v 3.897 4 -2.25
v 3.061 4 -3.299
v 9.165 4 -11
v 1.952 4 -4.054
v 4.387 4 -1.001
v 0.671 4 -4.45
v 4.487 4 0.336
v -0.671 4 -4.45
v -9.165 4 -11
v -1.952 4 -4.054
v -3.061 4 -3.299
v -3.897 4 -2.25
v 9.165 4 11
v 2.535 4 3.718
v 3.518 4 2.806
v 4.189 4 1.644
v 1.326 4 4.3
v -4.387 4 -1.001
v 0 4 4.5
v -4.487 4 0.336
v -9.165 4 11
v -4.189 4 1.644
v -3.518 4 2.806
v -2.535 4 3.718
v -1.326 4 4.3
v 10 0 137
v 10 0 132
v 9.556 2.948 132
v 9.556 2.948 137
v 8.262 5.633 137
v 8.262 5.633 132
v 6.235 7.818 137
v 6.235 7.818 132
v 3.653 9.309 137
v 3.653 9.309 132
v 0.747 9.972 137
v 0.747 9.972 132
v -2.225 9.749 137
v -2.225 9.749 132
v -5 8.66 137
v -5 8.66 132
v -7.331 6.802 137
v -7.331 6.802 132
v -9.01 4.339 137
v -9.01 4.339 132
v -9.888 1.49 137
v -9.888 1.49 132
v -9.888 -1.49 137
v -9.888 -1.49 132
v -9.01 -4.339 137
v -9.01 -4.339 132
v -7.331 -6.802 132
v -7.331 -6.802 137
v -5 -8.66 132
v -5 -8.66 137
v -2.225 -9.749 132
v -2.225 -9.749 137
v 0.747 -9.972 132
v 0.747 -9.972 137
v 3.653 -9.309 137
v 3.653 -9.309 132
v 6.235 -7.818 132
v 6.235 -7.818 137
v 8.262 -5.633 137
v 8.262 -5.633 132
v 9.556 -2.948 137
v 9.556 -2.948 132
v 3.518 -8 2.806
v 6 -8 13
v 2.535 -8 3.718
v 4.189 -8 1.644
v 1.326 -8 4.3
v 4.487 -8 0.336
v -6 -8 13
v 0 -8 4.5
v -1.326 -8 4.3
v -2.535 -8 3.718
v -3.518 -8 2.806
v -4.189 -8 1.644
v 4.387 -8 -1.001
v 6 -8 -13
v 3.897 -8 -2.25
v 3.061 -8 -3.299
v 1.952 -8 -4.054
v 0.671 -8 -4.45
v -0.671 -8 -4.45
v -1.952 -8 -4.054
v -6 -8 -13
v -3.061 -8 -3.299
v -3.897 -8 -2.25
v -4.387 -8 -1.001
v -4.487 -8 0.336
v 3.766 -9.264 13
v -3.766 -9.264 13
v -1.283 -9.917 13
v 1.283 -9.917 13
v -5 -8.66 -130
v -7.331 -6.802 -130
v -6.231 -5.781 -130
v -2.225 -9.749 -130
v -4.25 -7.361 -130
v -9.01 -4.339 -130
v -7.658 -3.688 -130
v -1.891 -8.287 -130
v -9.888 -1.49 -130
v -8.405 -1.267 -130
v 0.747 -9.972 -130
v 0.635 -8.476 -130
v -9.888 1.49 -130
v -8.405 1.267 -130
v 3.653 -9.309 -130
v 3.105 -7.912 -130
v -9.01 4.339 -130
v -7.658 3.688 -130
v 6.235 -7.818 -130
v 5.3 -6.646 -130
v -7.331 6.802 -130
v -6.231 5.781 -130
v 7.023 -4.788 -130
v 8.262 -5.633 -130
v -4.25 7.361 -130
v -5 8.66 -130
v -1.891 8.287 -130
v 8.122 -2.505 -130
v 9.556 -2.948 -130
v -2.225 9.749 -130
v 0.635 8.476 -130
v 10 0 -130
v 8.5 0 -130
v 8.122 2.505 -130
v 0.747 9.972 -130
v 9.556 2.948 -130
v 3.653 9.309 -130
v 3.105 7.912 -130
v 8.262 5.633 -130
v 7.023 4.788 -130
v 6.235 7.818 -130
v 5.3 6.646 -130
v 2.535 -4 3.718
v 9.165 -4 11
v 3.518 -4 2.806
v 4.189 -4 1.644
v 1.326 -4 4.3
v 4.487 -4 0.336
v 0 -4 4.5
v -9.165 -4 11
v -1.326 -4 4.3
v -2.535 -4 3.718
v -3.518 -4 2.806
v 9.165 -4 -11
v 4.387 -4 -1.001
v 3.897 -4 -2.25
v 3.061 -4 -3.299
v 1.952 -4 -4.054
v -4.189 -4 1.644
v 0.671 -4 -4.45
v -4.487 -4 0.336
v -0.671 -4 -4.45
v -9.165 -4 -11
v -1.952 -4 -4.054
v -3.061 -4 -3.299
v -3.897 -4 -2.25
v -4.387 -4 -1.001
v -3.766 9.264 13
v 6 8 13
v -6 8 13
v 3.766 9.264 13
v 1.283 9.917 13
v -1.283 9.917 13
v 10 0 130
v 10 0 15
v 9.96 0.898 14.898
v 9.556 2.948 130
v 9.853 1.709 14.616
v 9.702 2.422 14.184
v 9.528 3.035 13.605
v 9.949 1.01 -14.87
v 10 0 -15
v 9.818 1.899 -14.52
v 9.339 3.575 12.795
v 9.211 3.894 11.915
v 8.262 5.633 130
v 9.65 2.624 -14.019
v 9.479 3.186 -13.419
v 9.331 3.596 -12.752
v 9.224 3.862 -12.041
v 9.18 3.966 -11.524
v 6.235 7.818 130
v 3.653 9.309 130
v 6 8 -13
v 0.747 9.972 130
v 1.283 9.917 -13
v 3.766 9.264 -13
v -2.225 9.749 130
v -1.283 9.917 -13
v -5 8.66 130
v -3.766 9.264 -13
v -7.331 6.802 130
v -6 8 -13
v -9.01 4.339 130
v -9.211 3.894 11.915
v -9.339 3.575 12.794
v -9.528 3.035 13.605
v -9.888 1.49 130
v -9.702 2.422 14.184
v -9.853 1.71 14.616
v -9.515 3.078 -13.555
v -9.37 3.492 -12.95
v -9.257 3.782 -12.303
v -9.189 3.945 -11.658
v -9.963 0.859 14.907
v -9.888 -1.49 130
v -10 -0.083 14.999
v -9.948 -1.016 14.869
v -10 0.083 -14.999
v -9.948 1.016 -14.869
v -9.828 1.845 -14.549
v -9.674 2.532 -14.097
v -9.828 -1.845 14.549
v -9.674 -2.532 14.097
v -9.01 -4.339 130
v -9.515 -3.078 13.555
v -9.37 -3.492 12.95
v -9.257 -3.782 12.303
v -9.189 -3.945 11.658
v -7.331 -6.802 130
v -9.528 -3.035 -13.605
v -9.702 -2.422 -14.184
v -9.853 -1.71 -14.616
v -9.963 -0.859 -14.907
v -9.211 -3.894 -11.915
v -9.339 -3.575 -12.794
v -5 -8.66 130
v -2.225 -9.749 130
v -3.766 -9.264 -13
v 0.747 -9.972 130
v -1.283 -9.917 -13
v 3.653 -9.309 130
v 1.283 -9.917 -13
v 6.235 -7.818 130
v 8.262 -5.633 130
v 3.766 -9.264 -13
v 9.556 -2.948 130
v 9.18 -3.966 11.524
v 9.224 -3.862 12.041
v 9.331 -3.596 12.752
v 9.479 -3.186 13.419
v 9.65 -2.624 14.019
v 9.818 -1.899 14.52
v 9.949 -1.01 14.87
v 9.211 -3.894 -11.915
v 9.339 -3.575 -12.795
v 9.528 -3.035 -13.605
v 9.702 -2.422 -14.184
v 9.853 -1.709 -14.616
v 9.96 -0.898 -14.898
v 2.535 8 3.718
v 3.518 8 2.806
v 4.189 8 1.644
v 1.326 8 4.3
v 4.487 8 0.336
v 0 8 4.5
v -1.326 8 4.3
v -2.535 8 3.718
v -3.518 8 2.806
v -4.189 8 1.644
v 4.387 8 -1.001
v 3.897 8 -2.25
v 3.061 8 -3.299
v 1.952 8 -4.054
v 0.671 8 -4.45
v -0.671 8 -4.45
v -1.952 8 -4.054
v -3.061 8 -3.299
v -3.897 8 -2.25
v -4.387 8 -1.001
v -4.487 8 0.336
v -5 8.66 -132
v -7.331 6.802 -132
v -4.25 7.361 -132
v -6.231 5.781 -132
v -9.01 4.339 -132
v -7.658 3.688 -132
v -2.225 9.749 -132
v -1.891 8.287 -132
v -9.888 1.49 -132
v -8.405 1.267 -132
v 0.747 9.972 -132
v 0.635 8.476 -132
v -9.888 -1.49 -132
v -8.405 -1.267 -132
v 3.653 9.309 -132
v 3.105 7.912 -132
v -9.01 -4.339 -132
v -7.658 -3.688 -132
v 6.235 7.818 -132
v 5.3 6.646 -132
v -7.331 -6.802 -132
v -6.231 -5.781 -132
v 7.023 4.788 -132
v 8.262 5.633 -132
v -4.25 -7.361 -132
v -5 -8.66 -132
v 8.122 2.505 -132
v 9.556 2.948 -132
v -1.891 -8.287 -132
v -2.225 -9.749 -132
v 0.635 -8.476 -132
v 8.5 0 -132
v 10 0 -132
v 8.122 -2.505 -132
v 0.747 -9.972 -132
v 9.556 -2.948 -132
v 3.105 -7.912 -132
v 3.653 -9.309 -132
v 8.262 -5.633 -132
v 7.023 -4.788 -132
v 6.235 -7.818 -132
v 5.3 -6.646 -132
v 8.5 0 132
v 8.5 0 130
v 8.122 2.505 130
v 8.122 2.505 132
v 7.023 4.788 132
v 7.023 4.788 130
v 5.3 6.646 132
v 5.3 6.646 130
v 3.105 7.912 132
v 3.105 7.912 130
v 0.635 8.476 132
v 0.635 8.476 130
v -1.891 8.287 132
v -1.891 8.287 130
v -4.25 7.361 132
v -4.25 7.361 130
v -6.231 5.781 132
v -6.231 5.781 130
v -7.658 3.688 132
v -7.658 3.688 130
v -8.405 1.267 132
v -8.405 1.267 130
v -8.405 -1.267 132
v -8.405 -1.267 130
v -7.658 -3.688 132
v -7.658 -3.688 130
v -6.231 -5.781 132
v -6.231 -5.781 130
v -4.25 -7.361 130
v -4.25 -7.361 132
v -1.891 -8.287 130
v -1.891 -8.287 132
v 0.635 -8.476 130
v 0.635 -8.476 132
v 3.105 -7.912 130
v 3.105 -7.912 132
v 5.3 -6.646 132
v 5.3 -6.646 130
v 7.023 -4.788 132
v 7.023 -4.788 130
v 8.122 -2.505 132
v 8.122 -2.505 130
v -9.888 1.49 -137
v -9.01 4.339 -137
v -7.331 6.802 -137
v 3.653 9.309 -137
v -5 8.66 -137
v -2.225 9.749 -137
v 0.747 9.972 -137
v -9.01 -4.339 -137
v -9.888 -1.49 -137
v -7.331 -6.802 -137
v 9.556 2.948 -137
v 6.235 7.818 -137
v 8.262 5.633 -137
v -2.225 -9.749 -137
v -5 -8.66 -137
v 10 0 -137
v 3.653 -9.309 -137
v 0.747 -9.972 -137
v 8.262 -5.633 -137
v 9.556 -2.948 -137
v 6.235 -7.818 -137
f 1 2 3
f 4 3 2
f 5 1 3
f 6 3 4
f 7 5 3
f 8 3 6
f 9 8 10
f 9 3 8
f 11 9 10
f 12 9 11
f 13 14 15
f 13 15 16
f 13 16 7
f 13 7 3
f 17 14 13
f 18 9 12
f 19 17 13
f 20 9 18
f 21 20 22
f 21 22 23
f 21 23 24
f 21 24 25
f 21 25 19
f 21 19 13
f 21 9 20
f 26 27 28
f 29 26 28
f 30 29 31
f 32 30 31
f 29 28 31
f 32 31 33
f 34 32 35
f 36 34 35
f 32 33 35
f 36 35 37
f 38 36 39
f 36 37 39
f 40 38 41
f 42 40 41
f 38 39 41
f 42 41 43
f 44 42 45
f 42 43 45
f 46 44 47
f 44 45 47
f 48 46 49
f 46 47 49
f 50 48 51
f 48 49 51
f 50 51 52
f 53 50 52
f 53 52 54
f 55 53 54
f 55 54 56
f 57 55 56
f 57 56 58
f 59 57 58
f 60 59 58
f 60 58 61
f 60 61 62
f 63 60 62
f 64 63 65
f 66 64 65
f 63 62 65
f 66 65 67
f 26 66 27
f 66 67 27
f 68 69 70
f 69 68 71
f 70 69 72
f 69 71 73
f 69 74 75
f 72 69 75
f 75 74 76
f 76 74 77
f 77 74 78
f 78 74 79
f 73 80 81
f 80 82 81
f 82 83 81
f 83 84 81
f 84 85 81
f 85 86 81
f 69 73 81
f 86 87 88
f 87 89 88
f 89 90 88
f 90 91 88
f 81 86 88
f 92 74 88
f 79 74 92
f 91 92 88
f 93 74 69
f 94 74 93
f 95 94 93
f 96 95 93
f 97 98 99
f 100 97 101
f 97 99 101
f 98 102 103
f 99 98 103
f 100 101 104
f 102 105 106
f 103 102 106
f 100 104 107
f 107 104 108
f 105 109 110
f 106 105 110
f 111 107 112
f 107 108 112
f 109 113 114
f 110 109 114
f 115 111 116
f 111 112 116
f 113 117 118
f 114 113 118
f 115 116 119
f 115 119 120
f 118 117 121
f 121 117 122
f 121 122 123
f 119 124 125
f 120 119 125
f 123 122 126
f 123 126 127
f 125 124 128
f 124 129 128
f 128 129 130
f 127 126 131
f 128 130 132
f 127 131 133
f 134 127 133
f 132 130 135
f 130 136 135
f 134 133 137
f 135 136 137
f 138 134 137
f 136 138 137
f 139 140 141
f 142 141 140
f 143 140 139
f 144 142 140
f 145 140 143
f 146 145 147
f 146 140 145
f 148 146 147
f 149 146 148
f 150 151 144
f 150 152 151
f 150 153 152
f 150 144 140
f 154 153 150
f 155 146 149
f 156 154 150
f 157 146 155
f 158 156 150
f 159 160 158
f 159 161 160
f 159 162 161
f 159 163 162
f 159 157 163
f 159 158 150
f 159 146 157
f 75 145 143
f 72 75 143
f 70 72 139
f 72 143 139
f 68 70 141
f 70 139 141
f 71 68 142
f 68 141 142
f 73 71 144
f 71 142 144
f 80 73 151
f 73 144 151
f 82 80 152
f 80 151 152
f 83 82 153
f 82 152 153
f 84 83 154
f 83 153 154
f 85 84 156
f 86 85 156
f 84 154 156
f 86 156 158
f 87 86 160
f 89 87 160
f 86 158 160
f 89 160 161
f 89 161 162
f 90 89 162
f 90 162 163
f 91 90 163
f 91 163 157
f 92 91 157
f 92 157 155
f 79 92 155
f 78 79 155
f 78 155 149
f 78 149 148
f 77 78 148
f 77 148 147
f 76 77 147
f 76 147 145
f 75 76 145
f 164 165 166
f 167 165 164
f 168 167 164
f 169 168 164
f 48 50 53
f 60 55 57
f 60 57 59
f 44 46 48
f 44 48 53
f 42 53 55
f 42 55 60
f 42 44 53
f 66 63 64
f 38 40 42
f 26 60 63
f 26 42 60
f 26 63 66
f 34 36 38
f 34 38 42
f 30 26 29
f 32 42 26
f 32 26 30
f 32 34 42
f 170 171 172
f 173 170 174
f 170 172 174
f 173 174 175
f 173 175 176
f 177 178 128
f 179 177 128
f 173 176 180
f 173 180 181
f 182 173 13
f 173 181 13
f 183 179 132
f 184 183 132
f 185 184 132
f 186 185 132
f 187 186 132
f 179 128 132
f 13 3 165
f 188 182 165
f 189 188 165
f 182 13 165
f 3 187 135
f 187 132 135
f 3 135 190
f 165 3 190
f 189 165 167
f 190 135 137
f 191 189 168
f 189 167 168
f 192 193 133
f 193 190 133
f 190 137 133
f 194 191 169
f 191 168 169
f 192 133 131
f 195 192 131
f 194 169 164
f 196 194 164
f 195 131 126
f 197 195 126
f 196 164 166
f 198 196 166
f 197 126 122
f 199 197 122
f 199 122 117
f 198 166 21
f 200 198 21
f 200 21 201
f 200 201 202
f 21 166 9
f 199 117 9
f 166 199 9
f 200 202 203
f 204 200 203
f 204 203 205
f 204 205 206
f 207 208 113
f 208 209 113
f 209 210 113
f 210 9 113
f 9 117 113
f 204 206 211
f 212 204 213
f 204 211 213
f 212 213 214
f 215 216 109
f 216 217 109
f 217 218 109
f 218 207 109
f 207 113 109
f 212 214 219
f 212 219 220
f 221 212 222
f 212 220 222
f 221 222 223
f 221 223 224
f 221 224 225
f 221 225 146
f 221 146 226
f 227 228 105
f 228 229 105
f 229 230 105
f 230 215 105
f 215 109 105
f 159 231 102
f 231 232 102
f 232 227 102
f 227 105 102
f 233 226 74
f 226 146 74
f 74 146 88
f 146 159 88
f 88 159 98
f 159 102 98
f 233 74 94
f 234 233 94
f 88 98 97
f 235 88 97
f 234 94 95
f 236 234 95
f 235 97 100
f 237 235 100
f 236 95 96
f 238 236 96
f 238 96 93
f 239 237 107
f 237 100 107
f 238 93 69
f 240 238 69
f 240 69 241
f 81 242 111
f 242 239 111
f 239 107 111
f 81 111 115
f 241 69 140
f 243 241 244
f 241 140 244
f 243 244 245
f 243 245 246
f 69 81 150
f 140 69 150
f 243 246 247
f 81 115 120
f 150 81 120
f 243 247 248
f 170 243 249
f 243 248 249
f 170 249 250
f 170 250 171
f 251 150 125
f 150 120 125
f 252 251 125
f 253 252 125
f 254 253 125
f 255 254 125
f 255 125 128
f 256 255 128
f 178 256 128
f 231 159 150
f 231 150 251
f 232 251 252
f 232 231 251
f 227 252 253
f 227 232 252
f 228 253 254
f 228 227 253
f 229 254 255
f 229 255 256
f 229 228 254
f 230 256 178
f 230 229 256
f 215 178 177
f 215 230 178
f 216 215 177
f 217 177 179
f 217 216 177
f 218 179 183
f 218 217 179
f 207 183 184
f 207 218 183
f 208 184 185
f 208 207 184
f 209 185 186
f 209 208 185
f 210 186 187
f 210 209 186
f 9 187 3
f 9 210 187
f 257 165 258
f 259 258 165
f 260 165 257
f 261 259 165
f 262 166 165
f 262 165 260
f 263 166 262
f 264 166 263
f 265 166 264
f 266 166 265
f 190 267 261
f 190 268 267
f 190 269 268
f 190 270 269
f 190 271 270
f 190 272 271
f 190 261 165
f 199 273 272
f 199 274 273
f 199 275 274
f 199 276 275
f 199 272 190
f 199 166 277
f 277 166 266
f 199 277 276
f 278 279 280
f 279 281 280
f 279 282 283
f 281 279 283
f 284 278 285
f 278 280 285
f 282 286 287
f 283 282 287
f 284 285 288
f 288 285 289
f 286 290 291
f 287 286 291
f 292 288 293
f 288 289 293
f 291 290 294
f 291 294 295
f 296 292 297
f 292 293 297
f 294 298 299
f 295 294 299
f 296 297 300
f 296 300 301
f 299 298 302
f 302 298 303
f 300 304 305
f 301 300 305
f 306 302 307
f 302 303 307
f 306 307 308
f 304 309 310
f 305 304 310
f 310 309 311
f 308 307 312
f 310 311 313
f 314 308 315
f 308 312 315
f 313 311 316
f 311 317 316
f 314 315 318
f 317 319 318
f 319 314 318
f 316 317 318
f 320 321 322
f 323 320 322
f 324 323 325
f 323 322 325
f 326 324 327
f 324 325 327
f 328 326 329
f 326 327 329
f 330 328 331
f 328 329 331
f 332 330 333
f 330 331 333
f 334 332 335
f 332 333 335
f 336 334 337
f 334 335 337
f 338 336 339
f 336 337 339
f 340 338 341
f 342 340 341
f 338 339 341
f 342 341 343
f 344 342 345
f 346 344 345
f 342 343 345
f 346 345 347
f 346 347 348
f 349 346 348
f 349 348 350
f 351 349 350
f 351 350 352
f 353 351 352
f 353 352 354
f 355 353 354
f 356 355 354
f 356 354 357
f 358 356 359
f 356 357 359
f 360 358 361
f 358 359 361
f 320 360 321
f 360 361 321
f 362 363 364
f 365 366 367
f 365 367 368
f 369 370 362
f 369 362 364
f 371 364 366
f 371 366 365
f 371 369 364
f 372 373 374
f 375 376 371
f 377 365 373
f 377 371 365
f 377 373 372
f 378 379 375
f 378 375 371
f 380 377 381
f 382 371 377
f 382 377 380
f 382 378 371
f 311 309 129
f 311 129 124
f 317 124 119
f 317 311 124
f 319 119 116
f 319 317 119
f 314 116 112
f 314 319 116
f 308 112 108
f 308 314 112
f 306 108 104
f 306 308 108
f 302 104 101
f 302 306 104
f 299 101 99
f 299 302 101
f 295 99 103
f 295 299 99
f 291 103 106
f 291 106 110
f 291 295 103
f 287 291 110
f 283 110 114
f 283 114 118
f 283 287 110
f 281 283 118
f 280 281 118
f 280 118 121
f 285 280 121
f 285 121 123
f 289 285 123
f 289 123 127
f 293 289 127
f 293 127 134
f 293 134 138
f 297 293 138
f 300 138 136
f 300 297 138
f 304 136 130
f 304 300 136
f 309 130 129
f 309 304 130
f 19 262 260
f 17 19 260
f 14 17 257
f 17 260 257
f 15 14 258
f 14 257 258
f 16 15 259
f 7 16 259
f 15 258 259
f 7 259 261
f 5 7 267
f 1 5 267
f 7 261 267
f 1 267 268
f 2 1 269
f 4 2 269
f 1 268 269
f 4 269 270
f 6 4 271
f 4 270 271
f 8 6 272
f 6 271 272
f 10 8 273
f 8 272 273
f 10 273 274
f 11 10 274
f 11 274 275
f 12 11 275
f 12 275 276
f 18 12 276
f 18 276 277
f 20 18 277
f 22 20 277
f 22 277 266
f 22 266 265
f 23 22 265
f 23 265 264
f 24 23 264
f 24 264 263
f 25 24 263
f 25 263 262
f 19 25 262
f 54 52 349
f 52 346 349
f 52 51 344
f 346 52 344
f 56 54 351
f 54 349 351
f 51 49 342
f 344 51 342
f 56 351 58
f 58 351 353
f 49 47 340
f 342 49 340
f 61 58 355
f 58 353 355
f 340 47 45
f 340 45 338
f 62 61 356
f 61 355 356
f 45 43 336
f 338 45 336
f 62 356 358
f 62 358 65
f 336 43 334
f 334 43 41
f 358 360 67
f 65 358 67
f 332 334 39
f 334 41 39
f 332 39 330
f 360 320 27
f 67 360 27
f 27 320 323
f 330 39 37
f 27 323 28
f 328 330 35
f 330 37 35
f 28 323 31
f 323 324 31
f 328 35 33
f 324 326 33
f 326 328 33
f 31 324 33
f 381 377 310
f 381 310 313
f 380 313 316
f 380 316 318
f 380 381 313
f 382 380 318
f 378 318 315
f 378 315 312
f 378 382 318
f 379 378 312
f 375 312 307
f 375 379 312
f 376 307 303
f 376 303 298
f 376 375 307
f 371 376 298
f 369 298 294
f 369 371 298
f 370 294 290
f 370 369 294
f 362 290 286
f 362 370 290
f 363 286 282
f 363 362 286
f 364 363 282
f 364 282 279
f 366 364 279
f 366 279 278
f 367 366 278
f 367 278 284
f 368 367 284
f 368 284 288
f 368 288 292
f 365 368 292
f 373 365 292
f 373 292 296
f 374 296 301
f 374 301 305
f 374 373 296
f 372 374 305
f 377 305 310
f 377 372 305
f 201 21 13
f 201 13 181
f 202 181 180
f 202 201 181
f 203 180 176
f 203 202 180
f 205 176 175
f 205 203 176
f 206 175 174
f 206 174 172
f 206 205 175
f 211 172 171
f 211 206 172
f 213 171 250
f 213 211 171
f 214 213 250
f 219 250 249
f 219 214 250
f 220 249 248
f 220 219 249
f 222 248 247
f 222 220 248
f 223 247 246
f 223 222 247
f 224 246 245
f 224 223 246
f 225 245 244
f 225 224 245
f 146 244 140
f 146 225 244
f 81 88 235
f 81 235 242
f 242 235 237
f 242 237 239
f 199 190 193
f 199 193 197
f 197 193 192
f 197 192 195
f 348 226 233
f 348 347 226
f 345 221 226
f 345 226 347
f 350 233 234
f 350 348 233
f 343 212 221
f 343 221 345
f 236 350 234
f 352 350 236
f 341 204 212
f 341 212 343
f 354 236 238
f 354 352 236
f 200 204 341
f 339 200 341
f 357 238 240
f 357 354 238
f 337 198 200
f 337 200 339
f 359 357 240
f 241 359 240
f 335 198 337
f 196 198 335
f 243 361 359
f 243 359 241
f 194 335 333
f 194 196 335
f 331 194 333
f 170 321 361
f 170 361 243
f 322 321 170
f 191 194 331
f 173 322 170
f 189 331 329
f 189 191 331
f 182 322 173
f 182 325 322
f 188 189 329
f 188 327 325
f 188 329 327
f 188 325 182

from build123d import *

# Parameters (mm, degrees)
BOSS_EXTRUDE1_DEPTH      = 130
BOSS_EXTRUDE1_DEPTH_BACK = 130
SKETCH3_R                = 10
SKETCH4_R                = 8.5
BOSS_EXTRUDE2_DEPTH      = 2
SKETCH5_R                = 10
BOSS_EXTRUDE3_DEPTH      = 5
BOSS_EXTRUDE4_START      = 2
SKETCH6_R                = 8.5
BOSS_EXTRUDE4_DEPTH      = 2
BOSS_EXTRUDE5_START      = 5
SKETCH7_R                = 10
BOSS_EXTRUDE5_DEPTH      = 5
CUT_EXTRUDE1_DEPTH       = 138.727992797
CUT_EXTRUDE1_DEPTH_BACK  = 138.727992797
SKETCH8_W                = 26
SKETCH8_H                = 2
SKETCH9_R                = 4.5
CUT_EXTRUDE2_DEPTH       = 139.538803249


with BuildPart() as part:
    # Sketch3 → Boss-Extrude1 (new, two sides: drawn at the far end of the back side and taken through both)
    with BuildSketch(Plane.XY.offset(-BOSS_EXTRUDE1_DEPTH_BACK)):
        Circle(SKETCH3_R)
    extrude(amount=BOSS_EXTRUDE1_DEPTH + BOSS_EXTRUDE1_DEPTH_BACK)

    # Sketch4 → Boss-Extrude2 (add)
    with BuildSketch(Plane.XY.offset(130)):
        Circle(SKETCH4_R)
    extrude(amount=BOSS_EXTRUDE2_DEPTH)

    # Sketch5 → Boss-Extrude3 (add)
    with BuildSketch(Plane.XY.offset(132)):
        Circle(SKETCH5_R)
    extrude(amount=BOSS_EXTRUDE3_DEPTH)

    # Sketch6 → Boss-Extrude4 (add)
    with BuildSketch(Plane(origin=(0, 0, -130), x_dir=(-1, 0, 0), z_dir=(0, 0, -1)).offset(BOSS_EXTRUDE4_START)):
        Circle(SKETCH6_R)
    extrude(amount=-BOSS_EXTRUDE4_DEPTH)

    # Sketch7 → Boss-Extrude5 (add)
    with BuildSketch(Plane(origin=(0, 0, -132), x_dir=(-1, 0, 0), z_dir=(0, 0, -1)).offset(BOSS_EXTRUDE5_START)):
        Circle(SKETCH7_R)
    extrude(amount=-BOSS_EXTRUDE5_DEPTH)

    # Sketch8 → Cut-Extrude1 (cut, two sides: drawn at the far end of the back side and taken through both)
    with BuildSketch(Plane(origin=(0, 0, 0), x_dir=(0, 0, -1), z_dir=(1, 0, 0)).offset(-CUT_EXTRUDE1_DEPTH_BACK)):
        with Locations((0, 9)):
            Rectangle(SKETCH8_W, SKETCH8_H)
        with Locations((0, -9)):
            Rectangle(SKETCH8_W, SKETCH8_H)
        with BuildLine():
            Line((11, 4), (-11, 4))
            ThreePointArc((-11, 4), (-15, 0), (-11, -4))
            Line((-11, -4), (11, -4))
            ThreePointArc((11, -4), (15, 0), (11, 4))
        make_face()
    extrude(amount=CUT_EXTRUDE1_DEPTH + CUT_EXTRUDE1_DEPTH_BACK, mode=Mode.SUBTRACT)

    # Sketch9 → Cut-Extrude2 (cut, through all)
    with BuildSketch(Plane(origin=(0, 8, 0), x_dir=(1, 0, 0), z_dir=(0, 1, 0))):
        Circle(SKETCH9_R)
    extrude(amount=-CUT_EXTRUDE2_DEPTH, mode=Mode.SUBTRACT)


solid = part.part
